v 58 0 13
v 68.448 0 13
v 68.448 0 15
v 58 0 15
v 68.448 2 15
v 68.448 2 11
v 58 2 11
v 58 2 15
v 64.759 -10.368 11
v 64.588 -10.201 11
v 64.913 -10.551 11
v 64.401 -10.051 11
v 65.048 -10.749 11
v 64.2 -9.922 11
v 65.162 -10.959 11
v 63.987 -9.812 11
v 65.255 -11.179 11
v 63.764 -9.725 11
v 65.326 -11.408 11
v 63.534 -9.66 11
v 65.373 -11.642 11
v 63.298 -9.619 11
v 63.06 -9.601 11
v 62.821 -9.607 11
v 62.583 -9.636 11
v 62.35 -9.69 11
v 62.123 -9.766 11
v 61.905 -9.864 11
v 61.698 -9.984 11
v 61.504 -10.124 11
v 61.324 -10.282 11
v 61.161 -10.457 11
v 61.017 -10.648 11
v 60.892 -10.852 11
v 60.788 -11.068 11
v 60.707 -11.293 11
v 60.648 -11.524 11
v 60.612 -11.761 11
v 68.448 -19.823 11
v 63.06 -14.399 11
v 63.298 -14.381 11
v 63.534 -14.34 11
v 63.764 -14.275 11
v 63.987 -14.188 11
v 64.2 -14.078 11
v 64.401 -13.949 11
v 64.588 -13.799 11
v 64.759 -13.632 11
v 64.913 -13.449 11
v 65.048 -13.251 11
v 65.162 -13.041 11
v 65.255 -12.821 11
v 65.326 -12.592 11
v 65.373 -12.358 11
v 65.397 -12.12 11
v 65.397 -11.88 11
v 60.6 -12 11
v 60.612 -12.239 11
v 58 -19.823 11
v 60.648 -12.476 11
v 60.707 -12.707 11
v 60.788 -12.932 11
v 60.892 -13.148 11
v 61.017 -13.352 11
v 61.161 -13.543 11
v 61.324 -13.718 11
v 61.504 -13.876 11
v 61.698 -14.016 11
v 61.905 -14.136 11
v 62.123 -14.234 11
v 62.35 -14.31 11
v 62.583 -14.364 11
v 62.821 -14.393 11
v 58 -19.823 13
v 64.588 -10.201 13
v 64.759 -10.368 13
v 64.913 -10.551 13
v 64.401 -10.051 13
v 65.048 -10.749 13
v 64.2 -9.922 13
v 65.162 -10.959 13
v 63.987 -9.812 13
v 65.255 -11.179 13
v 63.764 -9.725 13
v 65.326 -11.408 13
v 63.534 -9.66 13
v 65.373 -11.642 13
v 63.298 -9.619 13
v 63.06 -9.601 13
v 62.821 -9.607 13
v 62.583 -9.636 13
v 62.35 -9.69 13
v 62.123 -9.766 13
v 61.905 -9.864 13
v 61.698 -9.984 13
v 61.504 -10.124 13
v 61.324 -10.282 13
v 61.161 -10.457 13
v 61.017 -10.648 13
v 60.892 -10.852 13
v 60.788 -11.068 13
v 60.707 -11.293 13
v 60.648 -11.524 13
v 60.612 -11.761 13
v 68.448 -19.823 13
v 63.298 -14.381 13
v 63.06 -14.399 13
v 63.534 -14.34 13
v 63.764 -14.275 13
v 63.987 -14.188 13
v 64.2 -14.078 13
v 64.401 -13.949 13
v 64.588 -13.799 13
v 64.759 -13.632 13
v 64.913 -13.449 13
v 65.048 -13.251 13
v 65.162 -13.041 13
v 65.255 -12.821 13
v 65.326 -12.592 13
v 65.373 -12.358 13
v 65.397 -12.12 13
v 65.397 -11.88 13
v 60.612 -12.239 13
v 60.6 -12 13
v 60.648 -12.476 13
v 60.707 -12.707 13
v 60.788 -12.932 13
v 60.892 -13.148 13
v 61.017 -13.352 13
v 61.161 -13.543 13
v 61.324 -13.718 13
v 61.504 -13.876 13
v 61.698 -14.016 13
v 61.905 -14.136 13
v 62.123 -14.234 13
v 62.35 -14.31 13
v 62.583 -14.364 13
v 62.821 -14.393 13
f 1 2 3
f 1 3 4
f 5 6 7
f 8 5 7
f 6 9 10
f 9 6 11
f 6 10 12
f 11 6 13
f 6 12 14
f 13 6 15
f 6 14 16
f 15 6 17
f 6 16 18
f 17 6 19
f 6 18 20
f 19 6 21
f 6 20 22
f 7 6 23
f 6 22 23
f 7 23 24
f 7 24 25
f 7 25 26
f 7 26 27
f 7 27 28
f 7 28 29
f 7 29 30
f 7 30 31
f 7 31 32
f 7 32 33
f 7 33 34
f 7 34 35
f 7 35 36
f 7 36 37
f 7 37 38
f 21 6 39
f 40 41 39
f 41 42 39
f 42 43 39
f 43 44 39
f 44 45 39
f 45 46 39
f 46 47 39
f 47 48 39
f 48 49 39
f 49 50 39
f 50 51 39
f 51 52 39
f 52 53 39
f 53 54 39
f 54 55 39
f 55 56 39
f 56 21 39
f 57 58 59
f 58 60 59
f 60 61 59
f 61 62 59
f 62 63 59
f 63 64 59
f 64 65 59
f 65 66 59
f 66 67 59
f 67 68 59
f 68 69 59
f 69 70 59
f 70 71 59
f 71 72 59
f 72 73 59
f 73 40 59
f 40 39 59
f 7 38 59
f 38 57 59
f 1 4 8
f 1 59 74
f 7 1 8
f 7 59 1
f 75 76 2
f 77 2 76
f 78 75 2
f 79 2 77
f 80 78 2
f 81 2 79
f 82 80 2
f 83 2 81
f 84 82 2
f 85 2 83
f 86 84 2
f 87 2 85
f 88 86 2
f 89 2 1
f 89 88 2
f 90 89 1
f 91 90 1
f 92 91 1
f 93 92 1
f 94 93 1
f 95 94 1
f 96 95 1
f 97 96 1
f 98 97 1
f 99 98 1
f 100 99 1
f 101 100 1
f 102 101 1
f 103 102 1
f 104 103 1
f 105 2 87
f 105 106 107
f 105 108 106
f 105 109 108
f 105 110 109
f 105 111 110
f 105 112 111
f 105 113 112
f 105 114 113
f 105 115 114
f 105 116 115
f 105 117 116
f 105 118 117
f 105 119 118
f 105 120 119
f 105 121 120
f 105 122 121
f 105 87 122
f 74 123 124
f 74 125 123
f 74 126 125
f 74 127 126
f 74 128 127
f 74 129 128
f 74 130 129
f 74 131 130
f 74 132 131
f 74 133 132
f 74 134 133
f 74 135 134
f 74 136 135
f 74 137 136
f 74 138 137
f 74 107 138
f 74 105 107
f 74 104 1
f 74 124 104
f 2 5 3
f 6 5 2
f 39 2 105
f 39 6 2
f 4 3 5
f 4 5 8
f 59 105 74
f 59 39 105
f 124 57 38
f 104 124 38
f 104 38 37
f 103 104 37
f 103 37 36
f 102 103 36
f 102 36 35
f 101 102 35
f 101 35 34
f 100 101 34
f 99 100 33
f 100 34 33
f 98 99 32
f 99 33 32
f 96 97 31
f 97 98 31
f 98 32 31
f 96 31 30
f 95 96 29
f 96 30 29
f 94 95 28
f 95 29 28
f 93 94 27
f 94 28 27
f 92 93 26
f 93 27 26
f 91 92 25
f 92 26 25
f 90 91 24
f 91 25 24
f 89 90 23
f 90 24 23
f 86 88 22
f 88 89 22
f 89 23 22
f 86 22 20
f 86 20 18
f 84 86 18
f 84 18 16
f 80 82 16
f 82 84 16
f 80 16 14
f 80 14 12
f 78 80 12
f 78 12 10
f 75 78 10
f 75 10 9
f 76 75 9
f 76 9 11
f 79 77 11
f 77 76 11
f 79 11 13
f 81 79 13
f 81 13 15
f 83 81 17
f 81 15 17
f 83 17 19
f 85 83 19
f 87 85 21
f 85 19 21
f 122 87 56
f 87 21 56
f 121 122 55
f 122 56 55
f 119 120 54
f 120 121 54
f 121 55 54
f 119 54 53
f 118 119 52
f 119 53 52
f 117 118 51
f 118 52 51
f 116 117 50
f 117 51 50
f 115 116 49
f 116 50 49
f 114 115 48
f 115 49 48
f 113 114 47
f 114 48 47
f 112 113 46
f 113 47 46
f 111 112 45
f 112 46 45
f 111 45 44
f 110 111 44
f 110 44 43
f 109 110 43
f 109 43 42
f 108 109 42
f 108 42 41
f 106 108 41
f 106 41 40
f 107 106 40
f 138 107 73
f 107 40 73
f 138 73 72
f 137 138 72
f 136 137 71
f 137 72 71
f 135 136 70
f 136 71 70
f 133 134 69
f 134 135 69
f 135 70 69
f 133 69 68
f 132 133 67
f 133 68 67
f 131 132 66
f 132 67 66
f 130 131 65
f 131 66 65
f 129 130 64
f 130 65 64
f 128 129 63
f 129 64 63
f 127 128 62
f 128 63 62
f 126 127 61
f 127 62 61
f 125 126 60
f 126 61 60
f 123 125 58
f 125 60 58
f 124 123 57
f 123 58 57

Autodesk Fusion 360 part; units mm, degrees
sketch "Esboço1" plane through (0, 0, 0) normal (0, 0, 1) x (1, 0, 0)
  line L0 (9, 9.5) -> (-9, 9.5)
  line L1 (-9, 9.5) -> (-9, -9.5)
  line L2 (-9, -9.5) -> (9, -9.5)
  line L3 (9, -9.5) -> (9, 9.5)
  line L4 (9, 9.5) -> (-9, -9.5) construction
  line L5 (-9, 9.5) -> (9, -9.5) construction
  line L6 (-7, -7.5) -> (7, -7.5)
  line L7 (7, -7.5) -> (7, 7.5)
  line L8 (7, 7.5) -> (-7, 7.5)
  line L9 (-7, 7.5) -> (-7, -7.5)
  dimension "d1" = 18
  dimension "d2" = 19
  dimension "d3" = -2
extrude "Extrusão1" add sketch "Esboço1" along normal blind 2 makes body 1
sketch "Esboço2" plane through (0, 0, 2) normal (0, 0, 1) x (-1, 0, 0)
  line L0 (7, 7.5) -> (7, -7.5)
  line L1 (7, -7.5) -> (-7, -7.5)
  line L2 (-7, -7.5) -> (-7, 7.5)
  line L3 (-7, 7.5) -> (7, 7.5)
  line L4 (-9, 9.5) -> (-9, -9.5)
  line L5 (-9, -9.5) -> (9, -9.5)
  line L6 (9, -9.5) -> (9, 9.5)
  line L7 (9, 9.5) -> (-9, 9.5)
  line L8 (-11, 9.5) -> (-11, -9.5)
  line L9 (-9, -11.5) -> (9, -11.5)
  line L10 (11, -9.5) -> (11, 9.5)
  line L11 (9, 11.5) -> (-9, 11.5)
  arc A0 (11, 9.5) -> (9, 11.5) centre (9, 9.5) ccw
  arc A1 (-9, 11.5) -> (-11, 9.5) centre (-9, 9.5) ccw
  arc A2 (-11, -9.5) -> (-9, -11.5) centre (-9, -9.5) ccw
  arc A3 (9, -11.5) -> (11, -9.5) centre (9, -9.5) ccw
  dimension "d7" = 2
extrude "Extrusão2" add sketch "Esboço2" along normal blind 2 contours L4 L5 L6 L7 | L8 L9 L10 L11 A0 A1 A2 A3 bodies 1
fillet "Arredondamento1" radius 2 4 edges at (-9, 9.5, 1) (-9, -9.5, 1) (9, 9.5, 1) (9, -9.5, 1) on bodies 1
fillet "Arredondamento2" radius 1 4 edges at (-7, 7.5, 2) (-7, -7.5, 2) (7, -7.5, 2) (7, 7.5, 2) on bodies 1
sketch "Esboço3" plane through (0, 0, 0) normal (0, 0, 1) x (1, 0, 0)
  circle A0 centre (-41, 0) radius 12
  line L0 (-57.5, -16.5) -> (-24.5, -16.5)
  line L1 (-24.5, -16.5) -> (-24.5, 16.5)
  line L2 (-24.5, 16.5) -> (-57.5, 16.5)
  line L3 (-57.5, 16.5) -> (-57.5, -16.5)
  line L4 (-57.5, -16.5) -> (-24.5, 16.5) construction
  line L5 (-24.5, -16.5) -> (-57.5, 16.5) construction
  point P0 (-41, 0)
  dimension "d14" = 24
  dimension "d15" = 33
  dimension "d16" = 33
extrude "Extrusão3" add sketch "Esboço3" along normal blind 1 separate body makes body 2
sketch "Esboço4" plane through (0, 0, 0) normal (0, 0, 1) x (1, 0, 0)
  line L0 (73, 0) -> (53, 0)
  line L1 (53, 0) -> (53, -20)
  line L2 (53, -20) -> (73, -20)
  line L3 (73, -20) -> (73, 0)
  line L4 (63, -20) -> (63, -12)
  circle A0 centre (63, -12) radius 2.4
  dimension "d19" = 20
  dimension "d20" = 20
  dimension "d21" = 8
  dimension "d22" = 4.8
extrude "Extrusão4" add sketch "Esboço4" along normal blind 10 separate body makes body 3
fillet "Arredondamento3" radius 6 2 edges at (73, -20, 5) (53, -20, 5) on bodies 3
sketch "Esboço5" plane through (0, 0, 10) normal (0, 0, 1) x (-1, 0, 0)
  circle A0 centre (-63, 12) radius 2.4
  arc A1 (-53, 14) -> (-59, 20) centre (-59, 14) ccw
  line L0 (-59, 20) -> (-67, 20)
  arc A2 (-67, 20) -> (-73, 14) centre (-67, 14) ccw
  line L1 (-73, 14) -> (-73, 0)
  line L2 (-73, 0) -> (-53, 0)
  line L3 (-53, 0) -> (-53, 14)
  line L4 (-53, 0) -> (-73, 0)
  line L5 (-73, 0) -> (-73, -2)
  line L6 (-73, -2) -> (-53, -2)
  line L7 (-53, -2) -> (-53, 0)
  dimension "d27" = 2
extrude "Extrusão5" add sketch "Esboço5" along normal blind 2 from surface at 1 separate body makes body 4
sketch "Esboço6" plane through (0, 0, 13) normal (0, 0, 1) x (-1, 0, 0)
  circle A0 centre (-63, 12) radius 2.4
  line L0 (-53, -2) -> (-53, 14)
  arc A1 (-53, 14) -> (-59, 20) centre (-59, 14) ccw
  line L1 (-59, 20) -> (-67, 20)
  arc A2 (-67, 20) -> (-73, 14) centre (-67, 14) ccw
  line L2 (-73, 14) -> (-73, -2)
  line L3 (-73, -2) -> (-53, -2)
  line L4 (-53, -2) -> (-73, -2)
  line L5 (-73, -2) -> (-73, 0)
  line L6 (-73, 0) -> (-53, 0)
  line L7 (-53, 0) -> (-53, -2)
extrude "Extrusão6" add sketch "Esboço6" along normal blind 2 contours L0 L2 L3 L4 L5 L6 L7 bodies 4
sketch "Esboço7" plane through (0, 0, 11) normal (0, 0, -1) x (1, 0, 0)
  circle A0 centre (63, 12) radius 2.4
  line L0 (53, 14) -> (53, -2)
  line L1 (53, -2) -> (73, -2)
  line L2 (73, -2) -> (73, 14)
  arc A1 (73, 14) -> (67, 20) centre (67, 14) ccw
  line L3 (67, 20) -> (59, 20)
  arc A2 (59, 20) -> (53, 14) centre (59, 14) ccw
  line L4 (58, -2) -> (68.4479, -2)
  line L5 (68.4479, -2) -> (68.4479, 19.8227)
  line L6 (68.4479, 19.8227) -> (58, 19.8227)
  line L7 (58, 19.8227) -> (58, -2)
extrude "Extrusão7" cut sketch "Esboço7" against normal blind 10 contours L0 L1 A1 L3 A2 L6 L7 | L1 L2 A1 L5 bodies 4
hidden bodies 1 2 3
